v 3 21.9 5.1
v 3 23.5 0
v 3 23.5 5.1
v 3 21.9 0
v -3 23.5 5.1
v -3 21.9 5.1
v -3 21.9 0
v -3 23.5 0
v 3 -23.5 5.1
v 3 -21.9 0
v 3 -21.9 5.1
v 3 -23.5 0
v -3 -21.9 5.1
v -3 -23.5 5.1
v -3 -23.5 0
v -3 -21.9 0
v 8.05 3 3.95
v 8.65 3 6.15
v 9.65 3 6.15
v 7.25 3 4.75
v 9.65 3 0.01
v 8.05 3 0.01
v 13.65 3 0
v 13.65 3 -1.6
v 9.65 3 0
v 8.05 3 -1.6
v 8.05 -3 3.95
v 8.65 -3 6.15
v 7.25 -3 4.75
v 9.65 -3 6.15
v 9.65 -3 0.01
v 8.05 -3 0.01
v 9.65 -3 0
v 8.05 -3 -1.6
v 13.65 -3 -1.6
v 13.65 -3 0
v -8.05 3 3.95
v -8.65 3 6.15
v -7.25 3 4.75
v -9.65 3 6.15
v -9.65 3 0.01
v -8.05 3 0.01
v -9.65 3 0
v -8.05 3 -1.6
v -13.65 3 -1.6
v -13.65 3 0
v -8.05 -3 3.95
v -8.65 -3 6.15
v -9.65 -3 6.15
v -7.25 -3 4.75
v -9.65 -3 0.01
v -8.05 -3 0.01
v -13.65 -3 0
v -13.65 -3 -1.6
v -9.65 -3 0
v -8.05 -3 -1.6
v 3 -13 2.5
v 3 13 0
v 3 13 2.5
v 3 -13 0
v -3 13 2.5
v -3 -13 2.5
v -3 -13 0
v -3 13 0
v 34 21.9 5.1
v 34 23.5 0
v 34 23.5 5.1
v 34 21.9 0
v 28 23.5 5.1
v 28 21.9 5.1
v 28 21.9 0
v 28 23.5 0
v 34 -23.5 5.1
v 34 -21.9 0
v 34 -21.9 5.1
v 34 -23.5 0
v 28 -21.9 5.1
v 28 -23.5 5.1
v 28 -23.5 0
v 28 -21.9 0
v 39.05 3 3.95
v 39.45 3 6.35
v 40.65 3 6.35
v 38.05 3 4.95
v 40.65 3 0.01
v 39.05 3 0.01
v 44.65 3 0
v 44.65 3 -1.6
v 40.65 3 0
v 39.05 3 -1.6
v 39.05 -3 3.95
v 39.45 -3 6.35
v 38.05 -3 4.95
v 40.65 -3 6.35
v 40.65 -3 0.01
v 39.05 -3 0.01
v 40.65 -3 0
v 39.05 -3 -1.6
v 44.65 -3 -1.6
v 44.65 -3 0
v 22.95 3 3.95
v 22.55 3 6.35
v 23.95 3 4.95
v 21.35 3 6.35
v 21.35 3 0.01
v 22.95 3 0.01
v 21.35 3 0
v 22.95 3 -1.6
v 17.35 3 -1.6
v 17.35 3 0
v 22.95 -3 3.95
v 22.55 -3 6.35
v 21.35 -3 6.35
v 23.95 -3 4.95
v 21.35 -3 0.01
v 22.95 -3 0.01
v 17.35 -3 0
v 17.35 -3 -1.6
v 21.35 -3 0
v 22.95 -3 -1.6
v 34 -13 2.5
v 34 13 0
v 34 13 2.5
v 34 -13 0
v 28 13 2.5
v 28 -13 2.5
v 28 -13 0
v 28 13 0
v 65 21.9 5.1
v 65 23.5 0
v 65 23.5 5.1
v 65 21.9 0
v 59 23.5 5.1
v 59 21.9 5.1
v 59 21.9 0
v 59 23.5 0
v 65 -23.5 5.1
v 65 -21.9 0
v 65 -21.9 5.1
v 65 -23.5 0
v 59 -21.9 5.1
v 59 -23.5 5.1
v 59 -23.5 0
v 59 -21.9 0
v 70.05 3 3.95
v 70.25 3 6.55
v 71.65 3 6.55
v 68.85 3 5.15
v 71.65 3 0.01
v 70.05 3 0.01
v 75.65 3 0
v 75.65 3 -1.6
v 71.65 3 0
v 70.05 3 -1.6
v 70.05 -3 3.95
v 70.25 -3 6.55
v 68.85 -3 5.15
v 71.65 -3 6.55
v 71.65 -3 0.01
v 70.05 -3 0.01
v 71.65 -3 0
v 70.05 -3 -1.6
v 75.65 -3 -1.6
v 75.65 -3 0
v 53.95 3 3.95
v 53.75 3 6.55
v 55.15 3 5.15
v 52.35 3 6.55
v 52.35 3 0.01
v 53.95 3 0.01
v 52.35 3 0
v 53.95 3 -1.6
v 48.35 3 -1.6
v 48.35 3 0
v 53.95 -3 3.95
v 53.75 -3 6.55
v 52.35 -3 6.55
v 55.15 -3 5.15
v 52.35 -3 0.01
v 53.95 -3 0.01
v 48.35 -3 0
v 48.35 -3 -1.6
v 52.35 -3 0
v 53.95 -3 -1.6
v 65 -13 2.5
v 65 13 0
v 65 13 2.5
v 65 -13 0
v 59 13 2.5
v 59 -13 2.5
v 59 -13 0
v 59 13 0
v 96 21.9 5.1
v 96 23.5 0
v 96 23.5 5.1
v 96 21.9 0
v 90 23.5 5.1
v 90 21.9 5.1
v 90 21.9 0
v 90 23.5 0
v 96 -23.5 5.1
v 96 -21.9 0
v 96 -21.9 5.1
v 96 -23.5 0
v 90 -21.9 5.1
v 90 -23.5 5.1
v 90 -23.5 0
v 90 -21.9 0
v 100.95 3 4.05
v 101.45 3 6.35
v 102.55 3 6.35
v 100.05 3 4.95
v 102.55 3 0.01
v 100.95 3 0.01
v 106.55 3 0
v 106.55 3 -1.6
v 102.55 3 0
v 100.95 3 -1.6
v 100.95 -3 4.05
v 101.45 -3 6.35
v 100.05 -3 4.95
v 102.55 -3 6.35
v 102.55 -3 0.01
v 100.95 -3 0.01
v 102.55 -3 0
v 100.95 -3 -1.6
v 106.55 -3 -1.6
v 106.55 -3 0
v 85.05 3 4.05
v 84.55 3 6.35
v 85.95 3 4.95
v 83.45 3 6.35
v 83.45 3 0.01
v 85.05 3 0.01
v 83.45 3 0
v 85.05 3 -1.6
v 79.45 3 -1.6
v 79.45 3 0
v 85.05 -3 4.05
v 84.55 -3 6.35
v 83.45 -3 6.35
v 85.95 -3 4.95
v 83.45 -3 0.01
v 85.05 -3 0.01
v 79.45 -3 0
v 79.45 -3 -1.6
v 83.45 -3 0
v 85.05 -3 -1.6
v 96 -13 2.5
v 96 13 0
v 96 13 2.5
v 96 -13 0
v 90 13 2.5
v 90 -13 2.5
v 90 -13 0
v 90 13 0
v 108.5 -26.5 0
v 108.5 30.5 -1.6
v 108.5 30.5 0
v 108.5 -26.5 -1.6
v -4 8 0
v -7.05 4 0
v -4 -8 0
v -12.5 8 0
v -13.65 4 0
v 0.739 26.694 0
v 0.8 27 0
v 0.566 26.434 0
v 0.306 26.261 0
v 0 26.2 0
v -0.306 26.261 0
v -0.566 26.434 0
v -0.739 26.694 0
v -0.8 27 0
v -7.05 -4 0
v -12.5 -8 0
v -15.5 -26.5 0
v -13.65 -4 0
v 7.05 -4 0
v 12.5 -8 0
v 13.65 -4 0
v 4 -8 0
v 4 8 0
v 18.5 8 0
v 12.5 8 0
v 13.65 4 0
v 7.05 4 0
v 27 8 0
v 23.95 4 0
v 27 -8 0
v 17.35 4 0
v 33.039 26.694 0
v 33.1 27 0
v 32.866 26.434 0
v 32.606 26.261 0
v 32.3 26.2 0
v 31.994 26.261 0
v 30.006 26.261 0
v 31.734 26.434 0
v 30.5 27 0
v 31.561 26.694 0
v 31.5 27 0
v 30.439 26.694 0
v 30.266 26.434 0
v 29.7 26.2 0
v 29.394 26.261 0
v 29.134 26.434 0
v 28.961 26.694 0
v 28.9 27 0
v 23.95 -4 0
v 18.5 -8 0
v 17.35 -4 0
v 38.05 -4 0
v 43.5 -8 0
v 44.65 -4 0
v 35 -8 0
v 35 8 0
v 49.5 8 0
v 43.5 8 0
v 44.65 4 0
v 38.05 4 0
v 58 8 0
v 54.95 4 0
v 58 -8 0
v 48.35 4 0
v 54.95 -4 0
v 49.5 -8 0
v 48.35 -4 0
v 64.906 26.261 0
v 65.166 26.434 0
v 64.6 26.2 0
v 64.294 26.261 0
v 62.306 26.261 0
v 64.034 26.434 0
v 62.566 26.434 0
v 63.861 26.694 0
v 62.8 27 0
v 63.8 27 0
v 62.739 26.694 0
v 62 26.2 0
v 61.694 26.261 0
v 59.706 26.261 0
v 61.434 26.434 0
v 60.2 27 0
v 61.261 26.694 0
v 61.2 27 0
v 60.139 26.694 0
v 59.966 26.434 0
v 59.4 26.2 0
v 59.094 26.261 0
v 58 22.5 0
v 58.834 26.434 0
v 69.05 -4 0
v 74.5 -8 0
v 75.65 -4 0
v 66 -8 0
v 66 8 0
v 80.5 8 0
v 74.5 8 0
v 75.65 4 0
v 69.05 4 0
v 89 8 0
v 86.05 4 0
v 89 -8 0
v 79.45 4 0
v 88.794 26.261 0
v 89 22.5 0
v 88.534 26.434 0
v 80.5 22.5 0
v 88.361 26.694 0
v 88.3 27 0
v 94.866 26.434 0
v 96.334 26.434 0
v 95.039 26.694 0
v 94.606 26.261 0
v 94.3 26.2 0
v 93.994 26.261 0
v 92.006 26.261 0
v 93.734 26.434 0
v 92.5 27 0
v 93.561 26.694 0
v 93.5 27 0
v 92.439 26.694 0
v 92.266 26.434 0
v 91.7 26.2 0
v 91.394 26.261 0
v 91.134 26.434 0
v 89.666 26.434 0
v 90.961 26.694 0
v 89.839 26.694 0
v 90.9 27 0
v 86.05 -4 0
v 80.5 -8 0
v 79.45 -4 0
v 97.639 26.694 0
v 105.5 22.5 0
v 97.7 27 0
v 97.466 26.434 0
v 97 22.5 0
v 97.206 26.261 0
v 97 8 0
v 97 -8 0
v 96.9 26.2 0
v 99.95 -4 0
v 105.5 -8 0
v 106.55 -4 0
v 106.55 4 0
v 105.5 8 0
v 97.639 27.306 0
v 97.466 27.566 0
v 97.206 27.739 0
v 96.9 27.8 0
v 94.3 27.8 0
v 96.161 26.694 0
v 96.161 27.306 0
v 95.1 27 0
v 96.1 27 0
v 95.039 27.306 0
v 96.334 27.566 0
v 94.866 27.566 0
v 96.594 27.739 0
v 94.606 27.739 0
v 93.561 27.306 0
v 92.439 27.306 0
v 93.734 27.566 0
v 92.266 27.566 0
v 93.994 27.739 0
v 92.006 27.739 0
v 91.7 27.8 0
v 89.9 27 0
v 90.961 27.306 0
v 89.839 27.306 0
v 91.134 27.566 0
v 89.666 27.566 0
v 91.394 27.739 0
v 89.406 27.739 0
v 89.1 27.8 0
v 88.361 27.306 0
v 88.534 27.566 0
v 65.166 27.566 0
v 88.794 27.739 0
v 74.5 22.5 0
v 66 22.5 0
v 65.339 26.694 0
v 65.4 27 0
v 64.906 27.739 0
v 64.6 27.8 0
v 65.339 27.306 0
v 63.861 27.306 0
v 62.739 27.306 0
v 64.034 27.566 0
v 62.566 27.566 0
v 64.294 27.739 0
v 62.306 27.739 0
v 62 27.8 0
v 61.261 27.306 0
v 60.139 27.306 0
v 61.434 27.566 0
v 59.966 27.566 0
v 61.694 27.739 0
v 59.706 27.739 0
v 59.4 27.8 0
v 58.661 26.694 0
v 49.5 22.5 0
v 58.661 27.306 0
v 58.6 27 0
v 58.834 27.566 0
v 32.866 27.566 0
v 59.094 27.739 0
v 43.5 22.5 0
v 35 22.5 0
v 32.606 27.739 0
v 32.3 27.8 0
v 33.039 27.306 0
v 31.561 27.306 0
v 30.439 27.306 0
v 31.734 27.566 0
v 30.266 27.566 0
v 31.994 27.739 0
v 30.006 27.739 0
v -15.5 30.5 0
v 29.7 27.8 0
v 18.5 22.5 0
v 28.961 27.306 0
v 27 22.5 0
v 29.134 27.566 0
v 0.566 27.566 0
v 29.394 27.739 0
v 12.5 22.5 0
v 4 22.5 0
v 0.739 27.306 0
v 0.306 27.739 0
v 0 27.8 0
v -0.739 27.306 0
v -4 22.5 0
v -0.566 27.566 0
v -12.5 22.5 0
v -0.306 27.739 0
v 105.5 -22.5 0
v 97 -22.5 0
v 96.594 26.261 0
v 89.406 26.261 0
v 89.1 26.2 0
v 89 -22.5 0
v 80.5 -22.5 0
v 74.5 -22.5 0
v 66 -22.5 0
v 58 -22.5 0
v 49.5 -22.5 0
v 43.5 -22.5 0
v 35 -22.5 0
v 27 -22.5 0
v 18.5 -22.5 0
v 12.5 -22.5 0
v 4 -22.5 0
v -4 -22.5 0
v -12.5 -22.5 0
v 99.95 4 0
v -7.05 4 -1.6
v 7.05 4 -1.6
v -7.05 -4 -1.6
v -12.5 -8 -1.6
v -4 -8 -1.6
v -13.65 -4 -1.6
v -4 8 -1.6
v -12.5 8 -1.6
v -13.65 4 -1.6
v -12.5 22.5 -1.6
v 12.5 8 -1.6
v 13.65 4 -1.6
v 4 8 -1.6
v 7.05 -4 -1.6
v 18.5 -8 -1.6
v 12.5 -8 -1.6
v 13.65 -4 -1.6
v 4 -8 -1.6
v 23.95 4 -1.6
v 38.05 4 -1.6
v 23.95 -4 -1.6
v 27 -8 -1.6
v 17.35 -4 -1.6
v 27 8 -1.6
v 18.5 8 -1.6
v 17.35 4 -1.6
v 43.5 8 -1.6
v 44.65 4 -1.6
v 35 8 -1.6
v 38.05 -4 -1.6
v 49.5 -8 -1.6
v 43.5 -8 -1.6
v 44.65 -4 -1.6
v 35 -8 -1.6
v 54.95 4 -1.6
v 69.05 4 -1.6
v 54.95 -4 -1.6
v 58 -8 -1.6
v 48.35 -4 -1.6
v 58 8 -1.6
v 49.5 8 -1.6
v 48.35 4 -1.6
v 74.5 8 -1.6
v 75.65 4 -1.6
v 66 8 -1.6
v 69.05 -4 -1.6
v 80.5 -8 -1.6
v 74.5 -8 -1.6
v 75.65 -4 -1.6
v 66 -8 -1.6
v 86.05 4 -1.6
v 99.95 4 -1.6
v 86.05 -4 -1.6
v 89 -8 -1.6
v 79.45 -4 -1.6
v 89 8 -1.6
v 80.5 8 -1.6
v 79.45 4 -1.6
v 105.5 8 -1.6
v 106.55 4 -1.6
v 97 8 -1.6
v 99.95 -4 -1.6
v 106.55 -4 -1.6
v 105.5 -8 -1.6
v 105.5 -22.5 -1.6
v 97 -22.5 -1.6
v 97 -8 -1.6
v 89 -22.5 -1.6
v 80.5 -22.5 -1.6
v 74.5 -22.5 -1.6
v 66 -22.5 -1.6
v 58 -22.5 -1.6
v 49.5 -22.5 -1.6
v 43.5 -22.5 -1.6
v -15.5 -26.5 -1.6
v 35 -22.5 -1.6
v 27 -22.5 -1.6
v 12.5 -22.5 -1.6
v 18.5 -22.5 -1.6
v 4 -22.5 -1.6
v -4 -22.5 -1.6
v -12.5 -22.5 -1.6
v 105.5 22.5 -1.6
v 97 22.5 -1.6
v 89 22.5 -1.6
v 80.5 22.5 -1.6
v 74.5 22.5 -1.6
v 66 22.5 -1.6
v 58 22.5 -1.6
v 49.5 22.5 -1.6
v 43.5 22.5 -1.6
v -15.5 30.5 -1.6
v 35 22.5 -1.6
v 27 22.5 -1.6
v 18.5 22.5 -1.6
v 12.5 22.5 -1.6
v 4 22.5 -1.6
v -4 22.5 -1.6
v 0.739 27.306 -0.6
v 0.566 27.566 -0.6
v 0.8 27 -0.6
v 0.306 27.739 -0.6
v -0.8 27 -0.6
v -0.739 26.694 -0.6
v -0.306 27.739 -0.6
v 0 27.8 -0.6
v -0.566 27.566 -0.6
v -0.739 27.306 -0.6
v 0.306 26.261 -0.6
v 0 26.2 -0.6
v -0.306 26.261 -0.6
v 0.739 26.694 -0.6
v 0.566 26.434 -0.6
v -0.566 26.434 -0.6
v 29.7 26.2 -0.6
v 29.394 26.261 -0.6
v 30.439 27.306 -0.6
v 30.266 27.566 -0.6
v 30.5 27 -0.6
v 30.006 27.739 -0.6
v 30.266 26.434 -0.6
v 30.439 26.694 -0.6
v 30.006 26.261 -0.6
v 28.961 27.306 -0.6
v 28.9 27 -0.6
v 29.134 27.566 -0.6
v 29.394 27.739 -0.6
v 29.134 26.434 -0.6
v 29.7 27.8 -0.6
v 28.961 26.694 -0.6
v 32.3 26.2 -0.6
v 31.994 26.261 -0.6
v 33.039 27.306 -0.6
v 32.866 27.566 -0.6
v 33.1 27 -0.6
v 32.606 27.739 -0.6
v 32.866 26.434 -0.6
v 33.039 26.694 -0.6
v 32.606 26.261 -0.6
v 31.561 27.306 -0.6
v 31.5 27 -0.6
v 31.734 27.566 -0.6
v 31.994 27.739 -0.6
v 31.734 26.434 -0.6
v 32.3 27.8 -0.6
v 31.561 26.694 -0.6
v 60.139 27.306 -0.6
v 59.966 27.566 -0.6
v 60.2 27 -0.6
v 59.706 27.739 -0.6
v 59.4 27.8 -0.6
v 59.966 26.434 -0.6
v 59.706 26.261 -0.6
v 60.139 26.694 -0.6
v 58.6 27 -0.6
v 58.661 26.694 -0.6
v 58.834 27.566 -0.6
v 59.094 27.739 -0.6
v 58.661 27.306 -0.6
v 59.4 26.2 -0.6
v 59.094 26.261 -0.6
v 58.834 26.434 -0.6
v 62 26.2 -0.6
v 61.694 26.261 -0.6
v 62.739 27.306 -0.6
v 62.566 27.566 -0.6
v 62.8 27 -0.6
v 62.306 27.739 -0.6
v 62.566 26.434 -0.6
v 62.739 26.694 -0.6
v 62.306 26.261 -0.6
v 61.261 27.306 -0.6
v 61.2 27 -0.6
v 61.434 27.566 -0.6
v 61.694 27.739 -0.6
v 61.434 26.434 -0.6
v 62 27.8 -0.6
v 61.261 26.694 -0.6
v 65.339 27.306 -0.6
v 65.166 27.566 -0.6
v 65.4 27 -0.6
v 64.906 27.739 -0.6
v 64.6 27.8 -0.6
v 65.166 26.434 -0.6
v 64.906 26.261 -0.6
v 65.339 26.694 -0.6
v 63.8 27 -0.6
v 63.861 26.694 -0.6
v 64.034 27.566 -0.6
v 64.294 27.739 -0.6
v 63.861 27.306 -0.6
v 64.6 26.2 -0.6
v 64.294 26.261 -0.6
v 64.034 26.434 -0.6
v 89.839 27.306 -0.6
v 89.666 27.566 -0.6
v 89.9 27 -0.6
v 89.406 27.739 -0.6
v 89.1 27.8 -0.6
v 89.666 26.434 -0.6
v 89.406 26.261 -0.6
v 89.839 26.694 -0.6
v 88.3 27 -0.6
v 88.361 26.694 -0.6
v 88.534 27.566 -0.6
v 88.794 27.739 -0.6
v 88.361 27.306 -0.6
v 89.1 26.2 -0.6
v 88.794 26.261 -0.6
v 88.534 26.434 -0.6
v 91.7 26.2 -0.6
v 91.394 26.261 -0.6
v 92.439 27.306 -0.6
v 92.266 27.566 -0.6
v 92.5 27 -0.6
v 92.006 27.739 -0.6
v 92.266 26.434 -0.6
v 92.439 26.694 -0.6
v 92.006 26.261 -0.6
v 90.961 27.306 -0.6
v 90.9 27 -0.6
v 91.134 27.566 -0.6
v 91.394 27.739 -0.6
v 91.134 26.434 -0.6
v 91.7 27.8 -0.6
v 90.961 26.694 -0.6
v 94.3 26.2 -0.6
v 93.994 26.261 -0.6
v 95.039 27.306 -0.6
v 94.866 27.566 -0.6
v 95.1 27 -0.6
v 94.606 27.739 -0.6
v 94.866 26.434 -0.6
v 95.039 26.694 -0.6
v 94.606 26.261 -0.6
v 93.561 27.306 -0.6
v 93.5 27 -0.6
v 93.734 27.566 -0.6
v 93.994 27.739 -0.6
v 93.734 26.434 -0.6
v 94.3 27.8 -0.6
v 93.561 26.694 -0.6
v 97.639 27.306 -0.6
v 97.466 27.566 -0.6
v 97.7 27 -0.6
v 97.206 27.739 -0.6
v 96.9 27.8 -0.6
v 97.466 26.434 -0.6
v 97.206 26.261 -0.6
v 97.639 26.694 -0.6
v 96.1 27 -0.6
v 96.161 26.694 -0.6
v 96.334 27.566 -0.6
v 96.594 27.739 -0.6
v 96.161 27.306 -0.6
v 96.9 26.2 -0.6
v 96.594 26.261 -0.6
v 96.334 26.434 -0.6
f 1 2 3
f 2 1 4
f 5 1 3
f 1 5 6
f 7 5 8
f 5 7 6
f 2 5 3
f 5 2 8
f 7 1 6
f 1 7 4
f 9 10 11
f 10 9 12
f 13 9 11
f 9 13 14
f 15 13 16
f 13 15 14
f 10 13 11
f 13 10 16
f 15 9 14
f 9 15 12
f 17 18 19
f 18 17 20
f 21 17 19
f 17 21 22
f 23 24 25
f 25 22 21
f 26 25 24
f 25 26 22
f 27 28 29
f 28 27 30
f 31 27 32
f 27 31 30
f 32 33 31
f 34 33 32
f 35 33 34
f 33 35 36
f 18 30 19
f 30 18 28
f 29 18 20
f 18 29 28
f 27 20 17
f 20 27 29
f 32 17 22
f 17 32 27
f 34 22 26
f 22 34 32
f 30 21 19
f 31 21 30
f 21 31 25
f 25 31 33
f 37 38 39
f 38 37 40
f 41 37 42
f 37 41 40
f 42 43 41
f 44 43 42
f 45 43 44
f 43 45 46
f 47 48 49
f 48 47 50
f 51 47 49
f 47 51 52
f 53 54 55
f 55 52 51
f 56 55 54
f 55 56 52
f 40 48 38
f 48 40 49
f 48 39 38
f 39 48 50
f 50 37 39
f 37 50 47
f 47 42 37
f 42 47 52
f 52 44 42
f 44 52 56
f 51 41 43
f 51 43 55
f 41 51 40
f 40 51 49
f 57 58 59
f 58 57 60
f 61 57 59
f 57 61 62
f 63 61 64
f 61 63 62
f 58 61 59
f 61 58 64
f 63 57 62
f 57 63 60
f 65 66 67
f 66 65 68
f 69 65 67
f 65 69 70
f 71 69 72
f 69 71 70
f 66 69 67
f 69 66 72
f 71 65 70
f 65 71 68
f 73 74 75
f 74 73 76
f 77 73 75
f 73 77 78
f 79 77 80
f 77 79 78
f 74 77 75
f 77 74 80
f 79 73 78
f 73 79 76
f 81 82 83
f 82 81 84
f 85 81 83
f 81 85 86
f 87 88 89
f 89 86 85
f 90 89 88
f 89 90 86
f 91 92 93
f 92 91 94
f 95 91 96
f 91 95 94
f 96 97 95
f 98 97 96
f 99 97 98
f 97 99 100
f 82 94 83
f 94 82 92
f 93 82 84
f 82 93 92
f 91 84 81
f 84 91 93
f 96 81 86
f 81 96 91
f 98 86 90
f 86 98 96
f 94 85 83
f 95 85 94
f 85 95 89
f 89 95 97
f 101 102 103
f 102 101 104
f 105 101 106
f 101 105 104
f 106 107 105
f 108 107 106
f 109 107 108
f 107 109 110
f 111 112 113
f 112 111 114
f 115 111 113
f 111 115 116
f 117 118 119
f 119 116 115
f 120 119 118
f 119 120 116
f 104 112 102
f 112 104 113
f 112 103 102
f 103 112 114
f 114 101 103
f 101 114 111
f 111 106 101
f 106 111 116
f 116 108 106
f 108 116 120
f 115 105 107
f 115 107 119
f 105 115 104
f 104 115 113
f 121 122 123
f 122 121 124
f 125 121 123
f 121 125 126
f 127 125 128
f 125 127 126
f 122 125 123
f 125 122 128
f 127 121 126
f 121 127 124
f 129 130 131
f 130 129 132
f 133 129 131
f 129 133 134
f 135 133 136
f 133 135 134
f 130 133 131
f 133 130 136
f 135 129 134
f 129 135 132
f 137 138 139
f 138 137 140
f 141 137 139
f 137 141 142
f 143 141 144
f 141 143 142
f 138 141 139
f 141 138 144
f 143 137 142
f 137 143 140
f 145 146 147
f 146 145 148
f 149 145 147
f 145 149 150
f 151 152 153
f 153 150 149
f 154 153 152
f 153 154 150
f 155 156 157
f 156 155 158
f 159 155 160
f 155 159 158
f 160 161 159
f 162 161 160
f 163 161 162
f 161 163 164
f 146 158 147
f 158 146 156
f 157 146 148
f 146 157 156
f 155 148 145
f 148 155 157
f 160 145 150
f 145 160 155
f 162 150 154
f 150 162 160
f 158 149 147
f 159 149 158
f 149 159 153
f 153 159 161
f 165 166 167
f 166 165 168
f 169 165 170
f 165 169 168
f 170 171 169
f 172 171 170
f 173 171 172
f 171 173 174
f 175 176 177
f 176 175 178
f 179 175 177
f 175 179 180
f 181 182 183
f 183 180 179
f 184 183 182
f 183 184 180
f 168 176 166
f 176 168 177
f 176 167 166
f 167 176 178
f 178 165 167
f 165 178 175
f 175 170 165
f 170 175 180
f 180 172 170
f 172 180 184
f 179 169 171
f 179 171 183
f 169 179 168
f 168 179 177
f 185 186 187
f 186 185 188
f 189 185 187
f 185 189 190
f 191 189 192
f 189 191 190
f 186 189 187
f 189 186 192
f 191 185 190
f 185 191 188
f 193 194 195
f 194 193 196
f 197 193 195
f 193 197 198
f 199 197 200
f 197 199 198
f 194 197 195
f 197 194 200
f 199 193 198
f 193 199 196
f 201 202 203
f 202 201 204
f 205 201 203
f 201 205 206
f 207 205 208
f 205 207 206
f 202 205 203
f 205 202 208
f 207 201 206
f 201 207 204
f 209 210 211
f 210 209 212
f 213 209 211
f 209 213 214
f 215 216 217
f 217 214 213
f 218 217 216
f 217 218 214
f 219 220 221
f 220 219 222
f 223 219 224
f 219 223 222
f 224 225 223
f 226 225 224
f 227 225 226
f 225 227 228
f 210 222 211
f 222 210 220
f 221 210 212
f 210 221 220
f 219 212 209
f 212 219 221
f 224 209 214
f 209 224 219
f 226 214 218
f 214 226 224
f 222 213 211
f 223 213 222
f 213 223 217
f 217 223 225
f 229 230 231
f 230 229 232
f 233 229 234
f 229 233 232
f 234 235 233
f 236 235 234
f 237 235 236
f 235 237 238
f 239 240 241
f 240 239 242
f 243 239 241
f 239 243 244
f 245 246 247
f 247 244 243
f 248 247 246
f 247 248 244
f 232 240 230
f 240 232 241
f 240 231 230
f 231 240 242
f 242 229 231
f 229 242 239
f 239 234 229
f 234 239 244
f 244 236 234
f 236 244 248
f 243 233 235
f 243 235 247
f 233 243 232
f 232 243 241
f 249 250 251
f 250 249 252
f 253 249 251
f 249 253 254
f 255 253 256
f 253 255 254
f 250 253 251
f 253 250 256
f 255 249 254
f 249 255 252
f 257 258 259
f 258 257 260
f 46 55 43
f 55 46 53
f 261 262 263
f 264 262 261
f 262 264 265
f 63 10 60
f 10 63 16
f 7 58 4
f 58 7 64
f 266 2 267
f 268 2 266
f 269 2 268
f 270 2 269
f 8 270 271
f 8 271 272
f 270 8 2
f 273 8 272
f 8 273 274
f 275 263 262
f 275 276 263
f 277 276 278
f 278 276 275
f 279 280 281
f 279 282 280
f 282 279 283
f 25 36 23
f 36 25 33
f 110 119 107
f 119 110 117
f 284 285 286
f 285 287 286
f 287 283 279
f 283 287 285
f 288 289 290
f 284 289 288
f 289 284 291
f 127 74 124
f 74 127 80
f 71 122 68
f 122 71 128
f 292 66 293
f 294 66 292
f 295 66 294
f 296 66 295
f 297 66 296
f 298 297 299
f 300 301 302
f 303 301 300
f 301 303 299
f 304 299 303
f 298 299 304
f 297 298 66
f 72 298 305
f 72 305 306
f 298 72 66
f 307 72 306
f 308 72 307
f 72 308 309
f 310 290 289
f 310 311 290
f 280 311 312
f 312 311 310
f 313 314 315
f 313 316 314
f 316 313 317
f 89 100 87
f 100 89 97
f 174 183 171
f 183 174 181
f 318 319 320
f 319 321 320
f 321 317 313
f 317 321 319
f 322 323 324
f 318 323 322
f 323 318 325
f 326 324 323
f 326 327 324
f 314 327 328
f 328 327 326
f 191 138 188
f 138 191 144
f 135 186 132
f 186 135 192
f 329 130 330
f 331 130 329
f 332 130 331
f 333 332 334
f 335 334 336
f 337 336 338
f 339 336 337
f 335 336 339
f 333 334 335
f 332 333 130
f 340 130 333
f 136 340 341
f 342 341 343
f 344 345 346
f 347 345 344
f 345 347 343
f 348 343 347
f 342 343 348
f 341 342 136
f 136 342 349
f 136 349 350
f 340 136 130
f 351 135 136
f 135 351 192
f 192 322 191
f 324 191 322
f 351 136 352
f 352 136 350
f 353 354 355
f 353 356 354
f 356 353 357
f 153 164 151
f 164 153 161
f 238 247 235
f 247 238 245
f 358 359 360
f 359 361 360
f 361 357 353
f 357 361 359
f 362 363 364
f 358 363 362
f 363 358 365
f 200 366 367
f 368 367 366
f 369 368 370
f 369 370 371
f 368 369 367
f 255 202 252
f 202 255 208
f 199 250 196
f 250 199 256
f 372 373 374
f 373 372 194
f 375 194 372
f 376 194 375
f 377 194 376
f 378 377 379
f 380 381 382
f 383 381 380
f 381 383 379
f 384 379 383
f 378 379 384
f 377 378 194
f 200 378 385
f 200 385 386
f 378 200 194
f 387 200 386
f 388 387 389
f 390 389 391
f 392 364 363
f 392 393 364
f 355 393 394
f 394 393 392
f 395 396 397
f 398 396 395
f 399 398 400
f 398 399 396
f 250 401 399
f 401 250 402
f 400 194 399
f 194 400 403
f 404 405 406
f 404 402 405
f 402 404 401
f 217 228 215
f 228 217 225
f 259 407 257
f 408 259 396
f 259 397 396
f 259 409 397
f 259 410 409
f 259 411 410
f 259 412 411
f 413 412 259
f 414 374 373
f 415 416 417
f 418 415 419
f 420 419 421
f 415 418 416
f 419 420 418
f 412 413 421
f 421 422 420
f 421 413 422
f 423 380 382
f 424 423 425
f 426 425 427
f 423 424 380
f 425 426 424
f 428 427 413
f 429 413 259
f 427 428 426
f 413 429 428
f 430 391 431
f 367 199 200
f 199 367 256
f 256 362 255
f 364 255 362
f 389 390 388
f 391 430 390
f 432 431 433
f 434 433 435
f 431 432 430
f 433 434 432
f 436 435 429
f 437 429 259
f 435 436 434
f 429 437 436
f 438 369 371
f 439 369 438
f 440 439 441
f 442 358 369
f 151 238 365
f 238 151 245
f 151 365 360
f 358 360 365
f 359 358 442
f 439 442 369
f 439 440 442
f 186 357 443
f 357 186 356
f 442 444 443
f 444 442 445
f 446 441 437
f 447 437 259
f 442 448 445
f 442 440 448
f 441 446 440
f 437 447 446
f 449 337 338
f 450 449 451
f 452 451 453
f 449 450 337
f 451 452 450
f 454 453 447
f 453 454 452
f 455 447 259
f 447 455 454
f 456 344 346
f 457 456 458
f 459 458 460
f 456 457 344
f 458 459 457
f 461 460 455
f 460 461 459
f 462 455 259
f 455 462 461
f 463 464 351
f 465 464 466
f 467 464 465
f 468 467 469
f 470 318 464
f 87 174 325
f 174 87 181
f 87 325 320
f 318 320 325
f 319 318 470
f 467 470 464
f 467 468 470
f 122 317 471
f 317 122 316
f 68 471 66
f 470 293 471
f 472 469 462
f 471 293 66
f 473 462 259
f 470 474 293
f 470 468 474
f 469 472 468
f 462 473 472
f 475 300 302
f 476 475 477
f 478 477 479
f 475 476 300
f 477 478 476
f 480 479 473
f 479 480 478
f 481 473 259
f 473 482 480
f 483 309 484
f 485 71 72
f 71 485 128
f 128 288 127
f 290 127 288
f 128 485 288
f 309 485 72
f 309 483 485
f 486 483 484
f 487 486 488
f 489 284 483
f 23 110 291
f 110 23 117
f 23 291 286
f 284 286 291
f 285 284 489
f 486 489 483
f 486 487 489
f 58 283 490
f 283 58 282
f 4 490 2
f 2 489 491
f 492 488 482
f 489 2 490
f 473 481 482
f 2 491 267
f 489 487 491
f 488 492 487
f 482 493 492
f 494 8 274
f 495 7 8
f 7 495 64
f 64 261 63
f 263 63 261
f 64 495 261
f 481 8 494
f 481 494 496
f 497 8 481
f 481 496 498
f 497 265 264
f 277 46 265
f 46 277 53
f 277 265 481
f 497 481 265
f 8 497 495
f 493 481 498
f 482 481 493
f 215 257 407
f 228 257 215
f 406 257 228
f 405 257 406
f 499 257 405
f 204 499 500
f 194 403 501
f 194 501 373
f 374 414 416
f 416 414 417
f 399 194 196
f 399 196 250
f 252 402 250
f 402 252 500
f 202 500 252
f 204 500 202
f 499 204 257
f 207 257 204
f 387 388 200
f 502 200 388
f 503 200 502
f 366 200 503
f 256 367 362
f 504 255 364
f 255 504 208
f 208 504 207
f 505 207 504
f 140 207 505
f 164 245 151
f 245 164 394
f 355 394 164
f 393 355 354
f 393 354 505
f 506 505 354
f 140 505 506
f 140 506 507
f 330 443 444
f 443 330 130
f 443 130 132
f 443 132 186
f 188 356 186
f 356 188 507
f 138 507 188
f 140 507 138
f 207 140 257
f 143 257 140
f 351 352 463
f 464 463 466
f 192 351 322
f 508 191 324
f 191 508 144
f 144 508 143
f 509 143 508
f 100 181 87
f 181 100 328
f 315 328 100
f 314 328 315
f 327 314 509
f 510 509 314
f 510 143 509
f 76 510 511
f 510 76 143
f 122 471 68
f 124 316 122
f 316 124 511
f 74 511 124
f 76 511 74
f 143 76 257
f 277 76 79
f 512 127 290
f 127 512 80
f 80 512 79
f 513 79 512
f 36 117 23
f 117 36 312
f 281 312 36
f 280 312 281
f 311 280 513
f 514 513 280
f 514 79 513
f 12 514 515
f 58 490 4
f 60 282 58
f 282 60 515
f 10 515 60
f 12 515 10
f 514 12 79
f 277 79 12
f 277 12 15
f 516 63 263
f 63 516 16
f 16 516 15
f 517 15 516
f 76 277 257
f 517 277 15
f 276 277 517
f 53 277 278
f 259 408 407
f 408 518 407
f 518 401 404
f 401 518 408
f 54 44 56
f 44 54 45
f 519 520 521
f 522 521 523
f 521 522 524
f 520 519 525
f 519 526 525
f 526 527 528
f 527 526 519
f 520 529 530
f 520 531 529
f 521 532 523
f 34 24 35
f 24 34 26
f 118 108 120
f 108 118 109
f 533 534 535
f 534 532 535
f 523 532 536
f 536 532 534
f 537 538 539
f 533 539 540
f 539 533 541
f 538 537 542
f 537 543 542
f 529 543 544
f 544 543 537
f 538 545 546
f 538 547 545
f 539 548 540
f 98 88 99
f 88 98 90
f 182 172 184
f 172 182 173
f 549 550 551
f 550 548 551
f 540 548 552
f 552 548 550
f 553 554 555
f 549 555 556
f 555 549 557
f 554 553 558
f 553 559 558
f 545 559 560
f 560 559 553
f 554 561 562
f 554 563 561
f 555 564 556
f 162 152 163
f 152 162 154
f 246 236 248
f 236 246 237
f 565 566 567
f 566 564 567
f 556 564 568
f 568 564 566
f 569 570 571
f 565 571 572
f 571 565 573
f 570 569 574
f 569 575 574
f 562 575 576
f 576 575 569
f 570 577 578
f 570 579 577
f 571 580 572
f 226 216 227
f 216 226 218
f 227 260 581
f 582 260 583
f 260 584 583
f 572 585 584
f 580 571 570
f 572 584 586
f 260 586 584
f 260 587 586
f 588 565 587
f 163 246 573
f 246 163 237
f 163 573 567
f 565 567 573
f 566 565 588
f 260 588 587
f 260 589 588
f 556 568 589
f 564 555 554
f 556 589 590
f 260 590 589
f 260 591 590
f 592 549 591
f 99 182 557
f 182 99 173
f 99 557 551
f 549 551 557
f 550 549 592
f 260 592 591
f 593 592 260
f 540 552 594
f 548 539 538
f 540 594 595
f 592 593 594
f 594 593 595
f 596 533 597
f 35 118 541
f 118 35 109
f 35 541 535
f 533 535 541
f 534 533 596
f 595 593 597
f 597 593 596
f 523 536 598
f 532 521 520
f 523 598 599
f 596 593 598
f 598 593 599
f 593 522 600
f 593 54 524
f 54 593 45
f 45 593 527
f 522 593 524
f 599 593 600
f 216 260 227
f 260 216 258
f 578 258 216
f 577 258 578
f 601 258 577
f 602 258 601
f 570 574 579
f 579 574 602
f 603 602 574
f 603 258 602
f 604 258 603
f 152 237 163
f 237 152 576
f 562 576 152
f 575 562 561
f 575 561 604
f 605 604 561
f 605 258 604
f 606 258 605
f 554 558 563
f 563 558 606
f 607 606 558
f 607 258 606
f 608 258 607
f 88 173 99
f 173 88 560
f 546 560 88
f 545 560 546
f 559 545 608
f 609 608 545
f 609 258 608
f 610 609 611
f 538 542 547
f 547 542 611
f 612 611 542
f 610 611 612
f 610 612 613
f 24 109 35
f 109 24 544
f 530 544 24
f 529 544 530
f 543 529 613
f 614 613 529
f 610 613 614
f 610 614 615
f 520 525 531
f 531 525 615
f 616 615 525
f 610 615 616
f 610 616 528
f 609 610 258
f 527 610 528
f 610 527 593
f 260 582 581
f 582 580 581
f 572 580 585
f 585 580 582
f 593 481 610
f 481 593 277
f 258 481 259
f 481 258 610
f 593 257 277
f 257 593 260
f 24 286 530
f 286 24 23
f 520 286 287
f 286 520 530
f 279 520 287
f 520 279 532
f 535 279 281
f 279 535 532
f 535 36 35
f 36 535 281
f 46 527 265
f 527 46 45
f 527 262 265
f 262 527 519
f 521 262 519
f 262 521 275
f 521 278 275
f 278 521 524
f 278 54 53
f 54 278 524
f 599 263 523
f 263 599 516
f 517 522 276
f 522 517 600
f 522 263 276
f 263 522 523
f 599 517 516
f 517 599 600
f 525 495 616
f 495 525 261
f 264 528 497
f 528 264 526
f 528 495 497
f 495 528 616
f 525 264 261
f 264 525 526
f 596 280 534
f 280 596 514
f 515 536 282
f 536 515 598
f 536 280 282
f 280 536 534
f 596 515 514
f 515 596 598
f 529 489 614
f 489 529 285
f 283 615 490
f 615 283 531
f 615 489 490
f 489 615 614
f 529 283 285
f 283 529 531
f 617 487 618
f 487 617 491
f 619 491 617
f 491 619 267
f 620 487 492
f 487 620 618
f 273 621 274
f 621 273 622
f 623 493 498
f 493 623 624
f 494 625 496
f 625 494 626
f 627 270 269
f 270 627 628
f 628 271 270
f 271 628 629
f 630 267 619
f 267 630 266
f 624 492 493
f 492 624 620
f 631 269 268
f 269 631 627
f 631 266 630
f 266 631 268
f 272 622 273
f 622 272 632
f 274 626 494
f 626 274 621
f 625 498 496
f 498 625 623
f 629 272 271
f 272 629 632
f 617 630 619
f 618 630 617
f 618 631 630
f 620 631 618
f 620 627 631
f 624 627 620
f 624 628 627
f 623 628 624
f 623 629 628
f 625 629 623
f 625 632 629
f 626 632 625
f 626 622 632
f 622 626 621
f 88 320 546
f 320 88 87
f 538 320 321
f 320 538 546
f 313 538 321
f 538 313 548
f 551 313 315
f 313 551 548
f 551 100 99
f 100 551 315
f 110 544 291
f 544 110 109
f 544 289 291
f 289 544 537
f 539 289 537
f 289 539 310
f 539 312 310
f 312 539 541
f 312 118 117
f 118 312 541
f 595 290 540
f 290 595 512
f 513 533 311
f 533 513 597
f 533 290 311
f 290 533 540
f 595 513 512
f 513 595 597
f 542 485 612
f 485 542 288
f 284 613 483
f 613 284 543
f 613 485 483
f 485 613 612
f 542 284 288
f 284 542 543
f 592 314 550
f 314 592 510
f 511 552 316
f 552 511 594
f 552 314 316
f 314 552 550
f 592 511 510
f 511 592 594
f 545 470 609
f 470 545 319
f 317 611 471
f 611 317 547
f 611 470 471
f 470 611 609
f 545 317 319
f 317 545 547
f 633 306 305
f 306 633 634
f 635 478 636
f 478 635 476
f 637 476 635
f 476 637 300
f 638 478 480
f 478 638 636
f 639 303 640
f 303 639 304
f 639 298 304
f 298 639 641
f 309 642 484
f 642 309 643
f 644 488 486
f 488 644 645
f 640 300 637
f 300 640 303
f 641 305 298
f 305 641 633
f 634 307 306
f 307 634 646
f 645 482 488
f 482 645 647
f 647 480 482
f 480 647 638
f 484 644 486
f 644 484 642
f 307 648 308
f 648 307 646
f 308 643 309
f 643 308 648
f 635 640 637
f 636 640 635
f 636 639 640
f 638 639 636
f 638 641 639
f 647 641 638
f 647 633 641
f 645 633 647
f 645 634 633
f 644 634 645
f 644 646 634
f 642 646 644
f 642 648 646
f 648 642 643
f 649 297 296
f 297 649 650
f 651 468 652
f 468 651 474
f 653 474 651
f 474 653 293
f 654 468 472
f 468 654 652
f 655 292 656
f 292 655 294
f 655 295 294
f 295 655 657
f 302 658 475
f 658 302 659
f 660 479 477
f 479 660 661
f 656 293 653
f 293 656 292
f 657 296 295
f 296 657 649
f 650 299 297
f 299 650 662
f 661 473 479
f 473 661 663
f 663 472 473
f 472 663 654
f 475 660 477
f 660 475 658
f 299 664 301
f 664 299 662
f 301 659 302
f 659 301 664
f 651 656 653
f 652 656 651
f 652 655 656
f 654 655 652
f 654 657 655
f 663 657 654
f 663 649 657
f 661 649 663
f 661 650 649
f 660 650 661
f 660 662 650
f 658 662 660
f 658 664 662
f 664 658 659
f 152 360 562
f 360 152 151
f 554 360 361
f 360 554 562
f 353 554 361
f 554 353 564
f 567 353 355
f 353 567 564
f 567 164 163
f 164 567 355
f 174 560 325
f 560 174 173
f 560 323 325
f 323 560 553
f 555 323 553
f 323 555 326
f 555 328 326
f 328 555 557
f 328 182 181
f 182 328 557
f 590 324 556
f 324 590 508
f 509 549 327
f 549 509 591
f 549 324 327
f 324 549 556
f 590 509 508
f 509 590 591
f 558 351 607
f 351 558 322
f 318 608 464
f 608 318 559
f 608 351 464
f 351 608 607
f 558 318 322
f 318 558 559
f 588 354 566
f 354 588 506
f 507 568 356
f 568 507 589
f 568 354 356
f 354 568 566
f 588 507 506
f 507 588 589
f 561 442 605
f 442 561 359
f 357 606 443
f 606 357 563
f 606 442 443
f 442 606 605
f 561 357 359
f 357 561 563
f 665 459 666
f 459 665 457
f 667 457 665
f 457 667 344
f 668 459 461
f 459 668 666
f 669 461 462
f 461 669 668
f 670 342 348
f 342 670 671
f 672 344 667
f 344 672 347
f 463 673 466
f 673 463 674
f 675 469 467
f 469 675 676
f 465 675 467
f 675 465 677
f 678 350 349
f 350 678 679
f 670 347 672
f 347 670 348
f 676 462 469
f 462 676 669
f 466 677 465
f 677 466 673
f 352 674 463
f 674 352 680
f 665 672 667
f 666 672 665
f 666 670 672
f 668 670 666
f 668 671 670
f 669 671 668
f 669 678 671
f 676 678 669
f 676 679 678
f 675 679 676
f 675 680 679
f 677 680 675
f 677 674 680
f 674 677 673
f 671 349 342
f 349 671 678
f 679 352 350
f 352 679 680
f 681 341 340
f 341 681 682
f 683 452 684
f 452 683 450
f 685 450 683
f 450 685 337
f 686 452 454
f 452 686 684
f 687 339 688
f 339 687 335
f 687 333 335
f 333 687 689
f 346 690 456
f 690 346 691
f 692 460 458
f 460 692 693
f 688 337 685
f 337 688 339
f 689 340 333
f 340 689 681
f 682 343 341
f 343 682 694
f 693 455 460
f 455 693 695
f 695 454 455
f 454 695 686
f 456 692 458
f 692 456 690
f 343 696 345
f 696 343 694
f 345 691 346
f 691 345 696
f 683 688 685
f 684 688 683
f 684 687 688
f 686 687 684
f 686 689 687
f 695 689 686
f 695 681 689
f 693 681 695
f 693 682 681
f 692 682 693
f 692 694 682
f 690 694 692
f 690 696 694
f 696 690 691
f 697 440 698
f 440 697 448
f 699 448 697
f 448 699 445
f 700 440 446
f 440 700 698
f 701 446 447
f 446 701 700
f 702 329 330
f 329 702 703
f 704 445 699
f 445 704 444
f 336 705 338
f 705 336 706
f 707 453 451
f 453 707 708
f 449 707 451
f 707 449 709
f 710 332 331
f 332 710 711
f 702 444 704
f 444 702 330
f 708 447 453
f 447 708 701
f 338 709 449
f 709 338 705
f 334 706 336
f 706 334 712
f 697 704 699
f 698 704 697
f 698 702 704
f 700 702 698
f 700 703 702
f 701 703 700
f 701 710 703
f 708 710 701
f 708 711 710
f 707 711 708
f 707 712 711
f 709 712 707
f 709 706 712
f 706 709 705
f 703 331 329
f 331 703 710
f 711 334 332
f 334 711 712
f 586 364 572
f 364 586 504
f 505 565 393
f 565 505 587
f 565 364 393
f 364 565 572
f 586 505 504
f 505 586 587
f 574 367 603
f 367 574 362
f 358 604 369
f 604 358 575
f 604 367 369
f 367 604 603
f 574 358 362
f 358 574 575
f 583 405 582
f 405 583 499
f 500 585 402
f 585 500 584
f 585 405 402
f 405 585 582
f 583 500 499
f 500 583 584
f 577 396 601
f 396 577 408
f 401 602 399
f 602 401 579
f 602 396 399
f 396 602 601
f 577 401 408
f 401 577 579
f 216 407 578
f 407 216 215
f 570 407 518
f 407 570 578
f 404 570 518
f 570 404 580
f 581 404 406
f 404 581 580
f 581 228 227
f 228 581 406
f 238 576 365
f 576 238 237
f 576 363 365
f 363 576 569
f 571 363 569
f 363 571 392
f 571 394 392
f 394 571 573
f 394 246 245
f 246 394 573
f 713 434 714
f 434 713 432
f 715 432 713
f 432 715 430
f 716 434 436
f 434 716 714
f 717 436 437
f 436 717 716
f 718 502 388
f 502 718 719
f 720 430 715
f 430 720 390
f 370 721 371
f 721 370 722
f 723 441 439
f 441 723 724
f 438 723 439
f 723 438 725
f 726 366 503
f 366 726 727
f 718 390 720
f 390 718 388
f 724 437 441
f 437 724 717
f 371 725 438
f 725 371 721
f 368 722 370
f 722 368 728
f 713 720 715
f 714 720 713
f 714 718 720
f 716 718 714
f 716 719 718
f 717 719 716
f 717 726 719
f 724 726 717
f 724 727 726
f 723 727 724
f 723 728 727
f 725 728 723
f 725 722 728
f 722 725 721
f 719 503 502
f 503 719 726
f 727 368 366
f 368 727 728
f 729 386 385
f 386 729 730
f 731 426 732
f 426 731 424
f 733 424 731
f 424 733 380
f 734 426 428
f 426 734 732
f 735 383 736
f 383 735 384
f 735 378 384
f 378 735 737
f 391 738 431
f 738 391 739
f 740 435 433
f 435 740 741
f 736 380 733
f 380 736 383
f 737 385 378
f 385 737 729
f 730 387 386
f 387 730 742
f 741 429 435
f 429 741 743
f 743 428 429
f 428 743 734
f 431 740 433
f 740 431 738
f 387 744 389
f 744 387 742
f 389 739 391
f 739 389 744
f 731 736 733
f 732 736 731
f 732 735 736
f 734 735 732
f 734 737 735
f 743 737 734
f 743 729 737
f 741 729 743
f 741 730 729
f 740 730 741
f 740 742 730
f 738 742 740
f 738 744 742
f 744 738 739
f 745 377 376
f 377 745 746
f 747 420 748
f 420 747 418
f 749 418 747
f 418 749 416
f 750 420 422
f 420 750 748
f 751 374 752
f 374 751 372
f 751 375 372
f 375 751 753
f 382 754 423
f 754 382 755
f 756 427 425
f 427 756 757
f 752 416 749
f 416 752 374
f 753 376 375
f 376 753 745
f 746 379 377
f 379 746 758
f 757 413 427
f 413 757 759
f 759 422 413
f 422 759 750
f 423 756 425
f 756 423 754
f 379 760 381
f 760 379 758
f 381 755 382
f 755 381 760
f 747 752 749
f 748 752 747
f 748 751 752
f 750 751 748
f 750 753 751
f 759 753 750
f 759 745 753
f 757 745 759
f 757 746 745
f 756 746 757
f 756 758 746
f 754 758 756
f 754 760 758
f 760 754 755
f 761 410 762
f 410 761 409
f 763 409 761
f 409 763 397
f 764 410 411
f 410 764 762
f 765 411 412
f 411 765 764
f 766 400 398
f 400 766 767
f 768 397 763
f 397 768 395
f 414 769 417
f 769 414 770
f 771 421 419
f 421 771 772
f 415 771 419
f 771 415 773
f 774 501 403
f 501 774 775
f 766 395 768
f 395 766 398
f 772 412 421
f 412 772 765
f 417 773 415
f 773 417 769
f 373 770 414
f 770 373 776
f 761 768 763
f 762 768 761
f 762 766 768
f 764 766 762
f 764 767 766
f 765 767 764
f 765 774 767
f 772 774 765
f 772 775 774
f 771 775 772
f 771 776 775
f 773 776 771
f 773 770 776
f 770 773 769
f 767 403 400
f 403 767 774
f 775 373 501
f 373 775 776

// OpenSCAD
// file: ../board-pocket/board-pocket.scad
//-----------------------------------------------------------------------
// Board pocket: holds a board that has no mounting holes
//
// The board sits on a central pedestal with a pad of double-sided foam tape
// on top, inside a low wall that follows its outline. The pedestal keeps
// the board's edges off the floor, so lead stubs soldered through the edge
// holes have room underneath; gaps in the wall let the leads out. The wall
// only locates the board: the tape holds it down, and in a closed box a lid
// pad presses a pad of foam onto it (boardLidPad below).
//
// Modules, all in the same frame:
//   boardPocketGhost()   the board and its tape, for previews
//   boardPocketHolder()  the plastic: pedestal and outline wall, add to the floor
//   boardLidPad()        a block hanging from the lid that presses foam onto the board
//   boardLidPadGhost()   the foam under it, squashed, for previews
//
// Frame: origin on the floor top, under the centre of the board's outline.
// X along the board's length l, Y across its width w, Z up. Units: mm.
//
// Sides are listed [-X, +X, -Y, +Y], each one of
//   "gap"    wall with a gap in the middle for leads (gapW wide)
//   "solid"  whole wall: use it where the board takes a push (a plug)
//   "open"   no wall: the board's edge goes into a box wall (a USB port)
//
// Used by esp32-c3-supermini, esp32-s3-devkitc and rs485-max485.
//-----------------------------------------------------------------------

//-- From the controller project's receiver.scad / rack-end.scad (boardPocket), 2026-10-30
bpPedestal  = 2.5;     // floor to the tape: room for lead stubs under the board edges
bpTape      = 1.0;     // double-sided foam tape on the pedestal. CAL: how far it squashes
bpWall      = 1.2;     // outline wall thickness
bpRise      = 1.0;     // wall top above the PCB underside (the controller project's rack-end: 0.8 under the S3's module)
bpClearance = 0.4;     // per side, board outline to wall: PETG. 0.3 for PLA. Set by the fit piece
bpGapW      = 6;       // lead gap in a "gap" side
bpPadInset  = 4;       // default pedestal: the board less this all round

//-- Lid hold-down (the controller project's receiver / rack-end lid pads)
bpFoam      = 3.0;     // CAL: self-adhesive foam stuck under each lid pad
bpSqueeze   = 1.0;     // how far the lid squashes it: ~1/3 for soft foam, 0.3 for felt

//-- PCB underside above the floor top
function boardPocketZ(pedestal = bpPedestal, tape = bpTape) = pedestal + tape;
//-- default pedestal [l, w] for a board
function boardPocketPad(l, w, inset = bpPadInset) = [max(l - 2*inset, 4), max(w - 2*inset, 4)];
//-- Z of a lid pad's underside, pressing on a surface at surfaceZ (board top, or a part on it)
function boardLidPadZ(surfaceZ, foam = bpFoam, squeeze = bpSqueeze) =
  assert(squeeze > 0 && squeeze < foam, "foam would not touch the board")
  surfaceZ + foam - squeeze;

function bpSides4(s) = is_list(s) ? s : [s, s, s, s];

module boardPocketGhost(l, w, pcb = 1.6, pad, pedestal = bpPedestal, tape = bpTape)
{
  p = is_undef(pad) ? boardPocketPad(l, w) : pad;
  %color("White") translate([-p[0]/2, -p[1]/2, pedestal]) cube([p[0], p[1], tape]);
  %color("DarkGreen") translate([-l/2, -w/2, pedestal + tape]) cube([l, w, pcb]);
}

//-- pad: pedestal [l, w]; gapW a number or one per side
module boardPocketHolder(l, w, pad, sides = "gap", gapW = bpGapW, clearance = bpClearance,
                         pedestal = bpPedestal, tape = bpTape, wall = bpWall, rise = bpRise)
{
  p   = is_undef(pad) ? boardPocketPad(l, w) : pad;
  s   = bpSides4(sides);
  g   = bpSides4(gapW);
  ix  = l/2 + clearance;                 // inner half sizes
  iy  = w/2 + clearance;
  top = pedestal + tape + rise;
  assert(p[0] <= l && p[1] <= w, "pedestal bigger than the board");
  for (k = s) assert(k == "gap" || k == "solid" || k == "open", str("unknown side ", k));

  //-- pedestal, centred under the board
  translate([-p[0]/2, -p[1]/2, -0.01]) cube([p[0], p[1], pedestal + 0.01]);
  //-- outline wall
  difference()
  {
    translate([-ix - wall, -iy - wall, -0.01]) cube([2*(ix + wall), 2*(iy + wall), top + 0.01]);
    translate([-ix, -iy, -1]) cube([2*ix, 2*iy, top + 2]);
    for (i = [0 : 3])
    {
      //-- each side's cut, drawn for -X then turned into place
      ax = (i < 2) ? ix : iy;         // inner half size across the side
      al = (i < 2) ? iy : ix;         // half length along it
      rotate([0, 0, [0, 180, 90, 270][i]])   // -X, +X, -Y, +Y
      {
        if (s[i] == "gap")
          translate([-ax - wall - 1, -g[i]/2, -1]) cube([wall + 2, g[i], top + 2]);
        if (s[i] == "open")
          translate([-ax - wall - 1, -al - wall - 1, -1]) cube([wall + 1.01, 2*(al + wall + 1), top + 2]);
      }
    }
  }
}

//-- A lid pad over the rectangle size [x, y] centred at `at`, from the squashed foam up to
//-- lidZ (the lid's inner face in this frame), running `into` up into the lid plate
module boardLidPad(size, at = [0, 0], surfaceZ, lidZ, foam = bpFoam, squeeze = bpSqueeze, into = 0.5)
{
  z0 = boardLidPadZ(surfaceZ, foam, squeeze);
  assert(lidZ > z0, "lid is below the pad: the box is too low for the foam");
  translate([at[0] - size[0]/2, at[1] - size[1]/2, z0]) cube([size[0], size[1], lidZ - z0 + into]);
}

module boardLidPadGhost(size, at = [0, 0], surfaceZ, foam = bpFoam, squeeze = bpSqueeze)
{
  %color("Gray") translate([at[0] - size[0]/2, at[1] - size[1]/2, surfaceZ]) cube([size[0], size[1], foam - squeeze]);
}
// file: ../../util/marks.scad
//-----------------------------------------------------------------------
// Marks for fit pieces: n dots in a row, engraved into a face, so each
// variant can be told apart after printing. Origin: centre of the row, on
// the face; the dots cut down into -Z. Units: mm.
//-----------------------------------------------------------------------

markDotDia   = 1.6;
markDotPitch = 2.6;
markDotDepth = 0.6;

module markDots(n)
{
  for (i = [0 : n - 1])
    translate([(i - (n - 1)/2)*markDotPitch, 0, -markDotDepth])
      cylinder(d = markDotDia, h = markDotDepth + 1, $fn = 16);
}
// file: ../rs485-max485/rs485-max485.scad
//-----------------------------------------------------------------------
// TTL-to-RS485 module (MAX485 and friends), on the floor
//
// These modules have no mounting holes. The board sits on a taped pedestal
// inside an outline pocket (board-pocket), with lead gaps at both ends (bus
// end and logic end) and in the long sides. In a closed box two lid pads
// press foam onto it, one inboard of each end's pin row.
//
// Modules, all in the same frame:
//   rs485Ghost()     the board, its chips, pin holes and any screw terminal
//   rs485Holder()    the plastic: pedestal and outline pocket, add to the floor
//   rs485LidPads()   blocks under the lid that press foam onto the board
//
// Frame: origin on the floor top under the centre of the board. X along the
// board, bus end (A/B) at -X, logic end (VCC/TXD/RXD/GND) at +X. Z up. Units: mm.
//
// Sizes: pick a row of rs485Variants by name.
//-----------------------------------------------------------------------

//-- included, not used, so its default values (bpTape, bpClearance...) are in scope here
include <../board-pocket/board-pocket.scad>

//-- [name, length, width, pcb, tallest SMD, bus pins, logic pins, screw terminal [l, w, h] or undef]
rs485Variants = [
  //-- JZK 5-pack B09VGJCJKQ, auto-direction (MAX485 + CD4069). Outline measured 2026-10-21;
  //-- PCB CAL (probably 1.6). Bus end: A+ B- earth, bare holes. Logic: VCC TXD RXD GND
  ["jzk",    43.0, 15.5,  1.6, 2.0, 3, 4, undef],
  //-- XY-017 auto-direction (WINGONEER manual, manuals.plus/asin/B06XHH6B6R): 42.8 x 15.22 x 0.8.
  //-- Looks like the same family as the JZK; pin counts CAL
  ["xy-017", 42.8, 15.22, 0.8, 2.0, 3, 4, undef],
  //-- Classic blue MAX485 module (HW-0519 style): 44 x 14 on most listings (some 45 x 15, 46 x 12),
  //-- 4-pin header each end (RO RE DE DI / VCC B A GND), 2-way 5.08 screw terminal at the bus end.
  //-- PCB, terminal size and its place on the board CAL
  ["max485", 44.0, 14.0,  1.6, 2.0, 4, 4, [7.5, 10.2, 10.0]],
];
rs485Variant  = "jzk";

rs485PinPitch = 2.54;
rs485PinEnd   = 1.5;      // CAL: pin row centre from the board's end
rs485ChipSize = [5.0, 6.0, 1.75];   // SOIC-8, ghost only; placed either side of the middle (CAL)
//-- Holder (the controller project's receiver.scad / rack-end.scad)
rs485PadEnd   = 8.5;      // pedestal stops this far from each end: clear of the pin stubs
rs485PadSide  = 3.25;     // and this far from each long side (26 x 9 on the JZK)
rs485EndGap   = 10;       // lead gap at the ends: the 4-pin row is 7.62 across, plus wire
rs485SideGap  = 6;
rs485PadInset = 6;        // lid pads: this far inboard of each end
rs485PadLen   = 6;

function rs485(name = rs485Variant) = let (i = search([name], rs485Variants)[0])
  assert(i != [] && i != undef, str("unknown RS485 variant ", name)) rs485Variants[i];
function rs485Pad(variant = rs485Variant) = let (v = rs485(variant))
  [v[1] - 2*rs485PadEnd, v[2] - 2*rs485PadSide];
//-- PCB top above the floor
function rs485Top(variant = rs485Variant, pedestal = bpPedestal, tape = bpTape) =
  boardPocketZ(pedestal, tape) + rs485(variant)[3];

module rs485Ghost(variant = rs485Variant, pedestal = bpPedestal, tape = bpTape)
{
  v   = rs485(variant);
  top = rs485Top(variant, pedestal, tape);
  boardPocketGhost(v[1], v[2], v[3], rs485Pad(variant), pedestal, tape);
  for (x = [-1, 1])
    %color("Black") translate([x*5 - rs485ChipSize[0]/2, -rs485ChipSize[1]/2, top]) cube(rs485ChipSize);
  //-- pin rows across each end
  for (e = [[-1, v[5]], [1, v[6]]], i = [0 : e[1] - 1])
    %color("Gold") translate([e[0]*(v[1]/2 - rs485PinEnd), (i - (e[1] - 1)/2)*rs485PinPitch, top - v[3] - 0.01])
      cylinder(d = 1.0, h = v[3] + 0.02, $fn = 12);
  if (!is_undef(v[7]))
    %color("RoyalBlue") translate([-v[1]/2 + 3, -v[7][1]/2, top]) cube(v[7]);
}

module rs485Holder(variant = rs485Variant, sides = "gap", clearance = bpClearance,
                   pedestal = bpPedestal, tape = bpTape, rise = bpRise)
{
  v = rs485(variant);
  boardPocketHolder(v[1], v[2], rs485Pad(variant), sides,
                    [rs485EndGap, rs485EndGap, rs485SideGap, rs485SideGap],
                    clearance, pedestal, tape, bpWall, rise);
}

//-- lidZ: the lid's inner face above the floor top. With a screw terminal, the bus-end pad
//-- moves inboard of it
module rs485LidPads(lidZ, variant = rs485Variant, foam = bpFoam, squeeze = bpSqueeze,
                    pedestal = bpPedestal, tape = bpTape)
{
  v   = rs485(variant);
  top = rs485Top(variant, pedestal, tape);
  busIn = is_undef(v[7]) ? rs485PadInset : 3 + v[7][0] + 1;
  for (x = [-v[1]/2 + busIn + rs485PadLen/2, v[1]/2 - rs485PadInset - rs485PadLen/2])
    boardLidPad([rs485PadLen, v[2] - 3], [x, 0], top, lidZ, foam, squeeze);
}
// main file
//-----------------------------------------------------------------------
// Fit piece: four stations for the JZK TTL-RS485 module (43 x 15.5 x 1.6,
// no holes), marked 1 to 4 dots past the far end. Each is a 2.5-high
// pedestal strip under the board, an end stop at each end, and one hook on
// each long edge at mid-length, on its flex-relief tongue. Push the board
// down into each until both hooks click over. Then lift it by one end, tug
// it sideways, and pull it out.
//
//   1  reach 0.5, clearance 0.3
//   2  reach 0.7, clearance 0.3
//   3  reach 0.9, clearance 0.3
//   4  reach 0.7, clearance 0.2
//
// The floor is a 1.6 plate, as a carrier, with windows between the
// pedestal and the hooks. Boards run along Y, so a section along Y cuts
// every hook's profile. Set `variant` for another RS485 module. Prints
// base down, as exported, no supports. Units: mm.
//-----------------------------------------------------------------------

use <snap-hook.scad>
use <../rs485-max485/rs485-max485.scad>
use <../../util/marks.scad>

variant   = "jzk";
pedestal  = 2.5;       // floor to the board's underside: room for lead stubs
padW      = 6;         // pedestal strip, across the board
padEnd    = 8.5;       // strip stops this far from each end: clear of the pin rows
stopClear = 0.4;       // end stops to the board's ends (not under test)
stopW     = 6;
stopT     = 1.6;
stopRise  = 1.0;       // end stops above the board's top
plate     = 1.6;
pitch     = 31;        // stations along X: 15.5 + 2 x 6.9 past each edge, and a rail
spineW    = 8;         // floor under the pedestal, along Y
barW      = 16;        // floor under the hooks, along X
rail      = 3;         // floor round the edge of each cell
dotRoom   = 7;         // +Y rail, with the dots

stations  = [ [0.5, 0.3], [0.7, 0.3], [0.9, 0.3], [0.7, 0.2] ];   // [reach, clearance]

v   = rs485(variant);
L   = v[1]; W = v[2]; pcb = v[3];
top = pedestal + pcb;
n   = len(stations);
cx  = pitch/2;                       // cell half width
y0  = -(L/2 + stopClear + stopT + rail);
y1  =  L/2 + stopClear + stopT + dotRoom;
winX = [spineW/2, cx - rail];
winY = [barW/2, L/2 + stopClear + stopT - 1];

module station(reach, clearance)
{
  //-- pedestal strip and end stops
  translate([-padW/2, -(L/2 - padEnd), -0.01]) cube([padW, L - 2*padEnd, pedestal + 0.01]);
  for (m = [0, 1]) mirror([0, m, 0])
    translate([-stopW/2, L/2 + stopClear, -0.01]) cube([stopW, stopT, top + stopRise + 0.01]);
  snapHookPair(W, top, reach, clearance);
}

difference()
{
  union()
  {
    translate([-cx, y0, -plate]) cube([(n - 1)*pitch + 2*cx, y1 - y0, plate]);
    for (i = [0 : n - 1])
      translate([i*pitch, 0, 0]) station(stations[i][0], stations[i][1]);
  }
  for (i = [0 : n - 1])
    translate([i*pitch, 0, 0])
    {
      snapHookPairFloorCut(W, top, stations[i][0], stations[i][1], floorThick = plate);
      //-- windows in the four quadrants
      for (sx = [-1, 1], sy = [-1, 1])
        translate([sx > 0 ? winX[0] : -winX[1], sy > 0 ? winY[0] : -winY[1], -plate - 1])
          cube([winX[1] - winX[0], winY[1] - winY[0], plate + 2]);
      translate([0, y1 - dotRoom/2, 0]) markDots(i + 1);
    }
}

if ($preview)
  for (i = [0 : n - 1])
    translate([i*pitch, 0, 0]) rotate([0, 0, 90]) rs485Ghost(variant, pedestal, 0);
